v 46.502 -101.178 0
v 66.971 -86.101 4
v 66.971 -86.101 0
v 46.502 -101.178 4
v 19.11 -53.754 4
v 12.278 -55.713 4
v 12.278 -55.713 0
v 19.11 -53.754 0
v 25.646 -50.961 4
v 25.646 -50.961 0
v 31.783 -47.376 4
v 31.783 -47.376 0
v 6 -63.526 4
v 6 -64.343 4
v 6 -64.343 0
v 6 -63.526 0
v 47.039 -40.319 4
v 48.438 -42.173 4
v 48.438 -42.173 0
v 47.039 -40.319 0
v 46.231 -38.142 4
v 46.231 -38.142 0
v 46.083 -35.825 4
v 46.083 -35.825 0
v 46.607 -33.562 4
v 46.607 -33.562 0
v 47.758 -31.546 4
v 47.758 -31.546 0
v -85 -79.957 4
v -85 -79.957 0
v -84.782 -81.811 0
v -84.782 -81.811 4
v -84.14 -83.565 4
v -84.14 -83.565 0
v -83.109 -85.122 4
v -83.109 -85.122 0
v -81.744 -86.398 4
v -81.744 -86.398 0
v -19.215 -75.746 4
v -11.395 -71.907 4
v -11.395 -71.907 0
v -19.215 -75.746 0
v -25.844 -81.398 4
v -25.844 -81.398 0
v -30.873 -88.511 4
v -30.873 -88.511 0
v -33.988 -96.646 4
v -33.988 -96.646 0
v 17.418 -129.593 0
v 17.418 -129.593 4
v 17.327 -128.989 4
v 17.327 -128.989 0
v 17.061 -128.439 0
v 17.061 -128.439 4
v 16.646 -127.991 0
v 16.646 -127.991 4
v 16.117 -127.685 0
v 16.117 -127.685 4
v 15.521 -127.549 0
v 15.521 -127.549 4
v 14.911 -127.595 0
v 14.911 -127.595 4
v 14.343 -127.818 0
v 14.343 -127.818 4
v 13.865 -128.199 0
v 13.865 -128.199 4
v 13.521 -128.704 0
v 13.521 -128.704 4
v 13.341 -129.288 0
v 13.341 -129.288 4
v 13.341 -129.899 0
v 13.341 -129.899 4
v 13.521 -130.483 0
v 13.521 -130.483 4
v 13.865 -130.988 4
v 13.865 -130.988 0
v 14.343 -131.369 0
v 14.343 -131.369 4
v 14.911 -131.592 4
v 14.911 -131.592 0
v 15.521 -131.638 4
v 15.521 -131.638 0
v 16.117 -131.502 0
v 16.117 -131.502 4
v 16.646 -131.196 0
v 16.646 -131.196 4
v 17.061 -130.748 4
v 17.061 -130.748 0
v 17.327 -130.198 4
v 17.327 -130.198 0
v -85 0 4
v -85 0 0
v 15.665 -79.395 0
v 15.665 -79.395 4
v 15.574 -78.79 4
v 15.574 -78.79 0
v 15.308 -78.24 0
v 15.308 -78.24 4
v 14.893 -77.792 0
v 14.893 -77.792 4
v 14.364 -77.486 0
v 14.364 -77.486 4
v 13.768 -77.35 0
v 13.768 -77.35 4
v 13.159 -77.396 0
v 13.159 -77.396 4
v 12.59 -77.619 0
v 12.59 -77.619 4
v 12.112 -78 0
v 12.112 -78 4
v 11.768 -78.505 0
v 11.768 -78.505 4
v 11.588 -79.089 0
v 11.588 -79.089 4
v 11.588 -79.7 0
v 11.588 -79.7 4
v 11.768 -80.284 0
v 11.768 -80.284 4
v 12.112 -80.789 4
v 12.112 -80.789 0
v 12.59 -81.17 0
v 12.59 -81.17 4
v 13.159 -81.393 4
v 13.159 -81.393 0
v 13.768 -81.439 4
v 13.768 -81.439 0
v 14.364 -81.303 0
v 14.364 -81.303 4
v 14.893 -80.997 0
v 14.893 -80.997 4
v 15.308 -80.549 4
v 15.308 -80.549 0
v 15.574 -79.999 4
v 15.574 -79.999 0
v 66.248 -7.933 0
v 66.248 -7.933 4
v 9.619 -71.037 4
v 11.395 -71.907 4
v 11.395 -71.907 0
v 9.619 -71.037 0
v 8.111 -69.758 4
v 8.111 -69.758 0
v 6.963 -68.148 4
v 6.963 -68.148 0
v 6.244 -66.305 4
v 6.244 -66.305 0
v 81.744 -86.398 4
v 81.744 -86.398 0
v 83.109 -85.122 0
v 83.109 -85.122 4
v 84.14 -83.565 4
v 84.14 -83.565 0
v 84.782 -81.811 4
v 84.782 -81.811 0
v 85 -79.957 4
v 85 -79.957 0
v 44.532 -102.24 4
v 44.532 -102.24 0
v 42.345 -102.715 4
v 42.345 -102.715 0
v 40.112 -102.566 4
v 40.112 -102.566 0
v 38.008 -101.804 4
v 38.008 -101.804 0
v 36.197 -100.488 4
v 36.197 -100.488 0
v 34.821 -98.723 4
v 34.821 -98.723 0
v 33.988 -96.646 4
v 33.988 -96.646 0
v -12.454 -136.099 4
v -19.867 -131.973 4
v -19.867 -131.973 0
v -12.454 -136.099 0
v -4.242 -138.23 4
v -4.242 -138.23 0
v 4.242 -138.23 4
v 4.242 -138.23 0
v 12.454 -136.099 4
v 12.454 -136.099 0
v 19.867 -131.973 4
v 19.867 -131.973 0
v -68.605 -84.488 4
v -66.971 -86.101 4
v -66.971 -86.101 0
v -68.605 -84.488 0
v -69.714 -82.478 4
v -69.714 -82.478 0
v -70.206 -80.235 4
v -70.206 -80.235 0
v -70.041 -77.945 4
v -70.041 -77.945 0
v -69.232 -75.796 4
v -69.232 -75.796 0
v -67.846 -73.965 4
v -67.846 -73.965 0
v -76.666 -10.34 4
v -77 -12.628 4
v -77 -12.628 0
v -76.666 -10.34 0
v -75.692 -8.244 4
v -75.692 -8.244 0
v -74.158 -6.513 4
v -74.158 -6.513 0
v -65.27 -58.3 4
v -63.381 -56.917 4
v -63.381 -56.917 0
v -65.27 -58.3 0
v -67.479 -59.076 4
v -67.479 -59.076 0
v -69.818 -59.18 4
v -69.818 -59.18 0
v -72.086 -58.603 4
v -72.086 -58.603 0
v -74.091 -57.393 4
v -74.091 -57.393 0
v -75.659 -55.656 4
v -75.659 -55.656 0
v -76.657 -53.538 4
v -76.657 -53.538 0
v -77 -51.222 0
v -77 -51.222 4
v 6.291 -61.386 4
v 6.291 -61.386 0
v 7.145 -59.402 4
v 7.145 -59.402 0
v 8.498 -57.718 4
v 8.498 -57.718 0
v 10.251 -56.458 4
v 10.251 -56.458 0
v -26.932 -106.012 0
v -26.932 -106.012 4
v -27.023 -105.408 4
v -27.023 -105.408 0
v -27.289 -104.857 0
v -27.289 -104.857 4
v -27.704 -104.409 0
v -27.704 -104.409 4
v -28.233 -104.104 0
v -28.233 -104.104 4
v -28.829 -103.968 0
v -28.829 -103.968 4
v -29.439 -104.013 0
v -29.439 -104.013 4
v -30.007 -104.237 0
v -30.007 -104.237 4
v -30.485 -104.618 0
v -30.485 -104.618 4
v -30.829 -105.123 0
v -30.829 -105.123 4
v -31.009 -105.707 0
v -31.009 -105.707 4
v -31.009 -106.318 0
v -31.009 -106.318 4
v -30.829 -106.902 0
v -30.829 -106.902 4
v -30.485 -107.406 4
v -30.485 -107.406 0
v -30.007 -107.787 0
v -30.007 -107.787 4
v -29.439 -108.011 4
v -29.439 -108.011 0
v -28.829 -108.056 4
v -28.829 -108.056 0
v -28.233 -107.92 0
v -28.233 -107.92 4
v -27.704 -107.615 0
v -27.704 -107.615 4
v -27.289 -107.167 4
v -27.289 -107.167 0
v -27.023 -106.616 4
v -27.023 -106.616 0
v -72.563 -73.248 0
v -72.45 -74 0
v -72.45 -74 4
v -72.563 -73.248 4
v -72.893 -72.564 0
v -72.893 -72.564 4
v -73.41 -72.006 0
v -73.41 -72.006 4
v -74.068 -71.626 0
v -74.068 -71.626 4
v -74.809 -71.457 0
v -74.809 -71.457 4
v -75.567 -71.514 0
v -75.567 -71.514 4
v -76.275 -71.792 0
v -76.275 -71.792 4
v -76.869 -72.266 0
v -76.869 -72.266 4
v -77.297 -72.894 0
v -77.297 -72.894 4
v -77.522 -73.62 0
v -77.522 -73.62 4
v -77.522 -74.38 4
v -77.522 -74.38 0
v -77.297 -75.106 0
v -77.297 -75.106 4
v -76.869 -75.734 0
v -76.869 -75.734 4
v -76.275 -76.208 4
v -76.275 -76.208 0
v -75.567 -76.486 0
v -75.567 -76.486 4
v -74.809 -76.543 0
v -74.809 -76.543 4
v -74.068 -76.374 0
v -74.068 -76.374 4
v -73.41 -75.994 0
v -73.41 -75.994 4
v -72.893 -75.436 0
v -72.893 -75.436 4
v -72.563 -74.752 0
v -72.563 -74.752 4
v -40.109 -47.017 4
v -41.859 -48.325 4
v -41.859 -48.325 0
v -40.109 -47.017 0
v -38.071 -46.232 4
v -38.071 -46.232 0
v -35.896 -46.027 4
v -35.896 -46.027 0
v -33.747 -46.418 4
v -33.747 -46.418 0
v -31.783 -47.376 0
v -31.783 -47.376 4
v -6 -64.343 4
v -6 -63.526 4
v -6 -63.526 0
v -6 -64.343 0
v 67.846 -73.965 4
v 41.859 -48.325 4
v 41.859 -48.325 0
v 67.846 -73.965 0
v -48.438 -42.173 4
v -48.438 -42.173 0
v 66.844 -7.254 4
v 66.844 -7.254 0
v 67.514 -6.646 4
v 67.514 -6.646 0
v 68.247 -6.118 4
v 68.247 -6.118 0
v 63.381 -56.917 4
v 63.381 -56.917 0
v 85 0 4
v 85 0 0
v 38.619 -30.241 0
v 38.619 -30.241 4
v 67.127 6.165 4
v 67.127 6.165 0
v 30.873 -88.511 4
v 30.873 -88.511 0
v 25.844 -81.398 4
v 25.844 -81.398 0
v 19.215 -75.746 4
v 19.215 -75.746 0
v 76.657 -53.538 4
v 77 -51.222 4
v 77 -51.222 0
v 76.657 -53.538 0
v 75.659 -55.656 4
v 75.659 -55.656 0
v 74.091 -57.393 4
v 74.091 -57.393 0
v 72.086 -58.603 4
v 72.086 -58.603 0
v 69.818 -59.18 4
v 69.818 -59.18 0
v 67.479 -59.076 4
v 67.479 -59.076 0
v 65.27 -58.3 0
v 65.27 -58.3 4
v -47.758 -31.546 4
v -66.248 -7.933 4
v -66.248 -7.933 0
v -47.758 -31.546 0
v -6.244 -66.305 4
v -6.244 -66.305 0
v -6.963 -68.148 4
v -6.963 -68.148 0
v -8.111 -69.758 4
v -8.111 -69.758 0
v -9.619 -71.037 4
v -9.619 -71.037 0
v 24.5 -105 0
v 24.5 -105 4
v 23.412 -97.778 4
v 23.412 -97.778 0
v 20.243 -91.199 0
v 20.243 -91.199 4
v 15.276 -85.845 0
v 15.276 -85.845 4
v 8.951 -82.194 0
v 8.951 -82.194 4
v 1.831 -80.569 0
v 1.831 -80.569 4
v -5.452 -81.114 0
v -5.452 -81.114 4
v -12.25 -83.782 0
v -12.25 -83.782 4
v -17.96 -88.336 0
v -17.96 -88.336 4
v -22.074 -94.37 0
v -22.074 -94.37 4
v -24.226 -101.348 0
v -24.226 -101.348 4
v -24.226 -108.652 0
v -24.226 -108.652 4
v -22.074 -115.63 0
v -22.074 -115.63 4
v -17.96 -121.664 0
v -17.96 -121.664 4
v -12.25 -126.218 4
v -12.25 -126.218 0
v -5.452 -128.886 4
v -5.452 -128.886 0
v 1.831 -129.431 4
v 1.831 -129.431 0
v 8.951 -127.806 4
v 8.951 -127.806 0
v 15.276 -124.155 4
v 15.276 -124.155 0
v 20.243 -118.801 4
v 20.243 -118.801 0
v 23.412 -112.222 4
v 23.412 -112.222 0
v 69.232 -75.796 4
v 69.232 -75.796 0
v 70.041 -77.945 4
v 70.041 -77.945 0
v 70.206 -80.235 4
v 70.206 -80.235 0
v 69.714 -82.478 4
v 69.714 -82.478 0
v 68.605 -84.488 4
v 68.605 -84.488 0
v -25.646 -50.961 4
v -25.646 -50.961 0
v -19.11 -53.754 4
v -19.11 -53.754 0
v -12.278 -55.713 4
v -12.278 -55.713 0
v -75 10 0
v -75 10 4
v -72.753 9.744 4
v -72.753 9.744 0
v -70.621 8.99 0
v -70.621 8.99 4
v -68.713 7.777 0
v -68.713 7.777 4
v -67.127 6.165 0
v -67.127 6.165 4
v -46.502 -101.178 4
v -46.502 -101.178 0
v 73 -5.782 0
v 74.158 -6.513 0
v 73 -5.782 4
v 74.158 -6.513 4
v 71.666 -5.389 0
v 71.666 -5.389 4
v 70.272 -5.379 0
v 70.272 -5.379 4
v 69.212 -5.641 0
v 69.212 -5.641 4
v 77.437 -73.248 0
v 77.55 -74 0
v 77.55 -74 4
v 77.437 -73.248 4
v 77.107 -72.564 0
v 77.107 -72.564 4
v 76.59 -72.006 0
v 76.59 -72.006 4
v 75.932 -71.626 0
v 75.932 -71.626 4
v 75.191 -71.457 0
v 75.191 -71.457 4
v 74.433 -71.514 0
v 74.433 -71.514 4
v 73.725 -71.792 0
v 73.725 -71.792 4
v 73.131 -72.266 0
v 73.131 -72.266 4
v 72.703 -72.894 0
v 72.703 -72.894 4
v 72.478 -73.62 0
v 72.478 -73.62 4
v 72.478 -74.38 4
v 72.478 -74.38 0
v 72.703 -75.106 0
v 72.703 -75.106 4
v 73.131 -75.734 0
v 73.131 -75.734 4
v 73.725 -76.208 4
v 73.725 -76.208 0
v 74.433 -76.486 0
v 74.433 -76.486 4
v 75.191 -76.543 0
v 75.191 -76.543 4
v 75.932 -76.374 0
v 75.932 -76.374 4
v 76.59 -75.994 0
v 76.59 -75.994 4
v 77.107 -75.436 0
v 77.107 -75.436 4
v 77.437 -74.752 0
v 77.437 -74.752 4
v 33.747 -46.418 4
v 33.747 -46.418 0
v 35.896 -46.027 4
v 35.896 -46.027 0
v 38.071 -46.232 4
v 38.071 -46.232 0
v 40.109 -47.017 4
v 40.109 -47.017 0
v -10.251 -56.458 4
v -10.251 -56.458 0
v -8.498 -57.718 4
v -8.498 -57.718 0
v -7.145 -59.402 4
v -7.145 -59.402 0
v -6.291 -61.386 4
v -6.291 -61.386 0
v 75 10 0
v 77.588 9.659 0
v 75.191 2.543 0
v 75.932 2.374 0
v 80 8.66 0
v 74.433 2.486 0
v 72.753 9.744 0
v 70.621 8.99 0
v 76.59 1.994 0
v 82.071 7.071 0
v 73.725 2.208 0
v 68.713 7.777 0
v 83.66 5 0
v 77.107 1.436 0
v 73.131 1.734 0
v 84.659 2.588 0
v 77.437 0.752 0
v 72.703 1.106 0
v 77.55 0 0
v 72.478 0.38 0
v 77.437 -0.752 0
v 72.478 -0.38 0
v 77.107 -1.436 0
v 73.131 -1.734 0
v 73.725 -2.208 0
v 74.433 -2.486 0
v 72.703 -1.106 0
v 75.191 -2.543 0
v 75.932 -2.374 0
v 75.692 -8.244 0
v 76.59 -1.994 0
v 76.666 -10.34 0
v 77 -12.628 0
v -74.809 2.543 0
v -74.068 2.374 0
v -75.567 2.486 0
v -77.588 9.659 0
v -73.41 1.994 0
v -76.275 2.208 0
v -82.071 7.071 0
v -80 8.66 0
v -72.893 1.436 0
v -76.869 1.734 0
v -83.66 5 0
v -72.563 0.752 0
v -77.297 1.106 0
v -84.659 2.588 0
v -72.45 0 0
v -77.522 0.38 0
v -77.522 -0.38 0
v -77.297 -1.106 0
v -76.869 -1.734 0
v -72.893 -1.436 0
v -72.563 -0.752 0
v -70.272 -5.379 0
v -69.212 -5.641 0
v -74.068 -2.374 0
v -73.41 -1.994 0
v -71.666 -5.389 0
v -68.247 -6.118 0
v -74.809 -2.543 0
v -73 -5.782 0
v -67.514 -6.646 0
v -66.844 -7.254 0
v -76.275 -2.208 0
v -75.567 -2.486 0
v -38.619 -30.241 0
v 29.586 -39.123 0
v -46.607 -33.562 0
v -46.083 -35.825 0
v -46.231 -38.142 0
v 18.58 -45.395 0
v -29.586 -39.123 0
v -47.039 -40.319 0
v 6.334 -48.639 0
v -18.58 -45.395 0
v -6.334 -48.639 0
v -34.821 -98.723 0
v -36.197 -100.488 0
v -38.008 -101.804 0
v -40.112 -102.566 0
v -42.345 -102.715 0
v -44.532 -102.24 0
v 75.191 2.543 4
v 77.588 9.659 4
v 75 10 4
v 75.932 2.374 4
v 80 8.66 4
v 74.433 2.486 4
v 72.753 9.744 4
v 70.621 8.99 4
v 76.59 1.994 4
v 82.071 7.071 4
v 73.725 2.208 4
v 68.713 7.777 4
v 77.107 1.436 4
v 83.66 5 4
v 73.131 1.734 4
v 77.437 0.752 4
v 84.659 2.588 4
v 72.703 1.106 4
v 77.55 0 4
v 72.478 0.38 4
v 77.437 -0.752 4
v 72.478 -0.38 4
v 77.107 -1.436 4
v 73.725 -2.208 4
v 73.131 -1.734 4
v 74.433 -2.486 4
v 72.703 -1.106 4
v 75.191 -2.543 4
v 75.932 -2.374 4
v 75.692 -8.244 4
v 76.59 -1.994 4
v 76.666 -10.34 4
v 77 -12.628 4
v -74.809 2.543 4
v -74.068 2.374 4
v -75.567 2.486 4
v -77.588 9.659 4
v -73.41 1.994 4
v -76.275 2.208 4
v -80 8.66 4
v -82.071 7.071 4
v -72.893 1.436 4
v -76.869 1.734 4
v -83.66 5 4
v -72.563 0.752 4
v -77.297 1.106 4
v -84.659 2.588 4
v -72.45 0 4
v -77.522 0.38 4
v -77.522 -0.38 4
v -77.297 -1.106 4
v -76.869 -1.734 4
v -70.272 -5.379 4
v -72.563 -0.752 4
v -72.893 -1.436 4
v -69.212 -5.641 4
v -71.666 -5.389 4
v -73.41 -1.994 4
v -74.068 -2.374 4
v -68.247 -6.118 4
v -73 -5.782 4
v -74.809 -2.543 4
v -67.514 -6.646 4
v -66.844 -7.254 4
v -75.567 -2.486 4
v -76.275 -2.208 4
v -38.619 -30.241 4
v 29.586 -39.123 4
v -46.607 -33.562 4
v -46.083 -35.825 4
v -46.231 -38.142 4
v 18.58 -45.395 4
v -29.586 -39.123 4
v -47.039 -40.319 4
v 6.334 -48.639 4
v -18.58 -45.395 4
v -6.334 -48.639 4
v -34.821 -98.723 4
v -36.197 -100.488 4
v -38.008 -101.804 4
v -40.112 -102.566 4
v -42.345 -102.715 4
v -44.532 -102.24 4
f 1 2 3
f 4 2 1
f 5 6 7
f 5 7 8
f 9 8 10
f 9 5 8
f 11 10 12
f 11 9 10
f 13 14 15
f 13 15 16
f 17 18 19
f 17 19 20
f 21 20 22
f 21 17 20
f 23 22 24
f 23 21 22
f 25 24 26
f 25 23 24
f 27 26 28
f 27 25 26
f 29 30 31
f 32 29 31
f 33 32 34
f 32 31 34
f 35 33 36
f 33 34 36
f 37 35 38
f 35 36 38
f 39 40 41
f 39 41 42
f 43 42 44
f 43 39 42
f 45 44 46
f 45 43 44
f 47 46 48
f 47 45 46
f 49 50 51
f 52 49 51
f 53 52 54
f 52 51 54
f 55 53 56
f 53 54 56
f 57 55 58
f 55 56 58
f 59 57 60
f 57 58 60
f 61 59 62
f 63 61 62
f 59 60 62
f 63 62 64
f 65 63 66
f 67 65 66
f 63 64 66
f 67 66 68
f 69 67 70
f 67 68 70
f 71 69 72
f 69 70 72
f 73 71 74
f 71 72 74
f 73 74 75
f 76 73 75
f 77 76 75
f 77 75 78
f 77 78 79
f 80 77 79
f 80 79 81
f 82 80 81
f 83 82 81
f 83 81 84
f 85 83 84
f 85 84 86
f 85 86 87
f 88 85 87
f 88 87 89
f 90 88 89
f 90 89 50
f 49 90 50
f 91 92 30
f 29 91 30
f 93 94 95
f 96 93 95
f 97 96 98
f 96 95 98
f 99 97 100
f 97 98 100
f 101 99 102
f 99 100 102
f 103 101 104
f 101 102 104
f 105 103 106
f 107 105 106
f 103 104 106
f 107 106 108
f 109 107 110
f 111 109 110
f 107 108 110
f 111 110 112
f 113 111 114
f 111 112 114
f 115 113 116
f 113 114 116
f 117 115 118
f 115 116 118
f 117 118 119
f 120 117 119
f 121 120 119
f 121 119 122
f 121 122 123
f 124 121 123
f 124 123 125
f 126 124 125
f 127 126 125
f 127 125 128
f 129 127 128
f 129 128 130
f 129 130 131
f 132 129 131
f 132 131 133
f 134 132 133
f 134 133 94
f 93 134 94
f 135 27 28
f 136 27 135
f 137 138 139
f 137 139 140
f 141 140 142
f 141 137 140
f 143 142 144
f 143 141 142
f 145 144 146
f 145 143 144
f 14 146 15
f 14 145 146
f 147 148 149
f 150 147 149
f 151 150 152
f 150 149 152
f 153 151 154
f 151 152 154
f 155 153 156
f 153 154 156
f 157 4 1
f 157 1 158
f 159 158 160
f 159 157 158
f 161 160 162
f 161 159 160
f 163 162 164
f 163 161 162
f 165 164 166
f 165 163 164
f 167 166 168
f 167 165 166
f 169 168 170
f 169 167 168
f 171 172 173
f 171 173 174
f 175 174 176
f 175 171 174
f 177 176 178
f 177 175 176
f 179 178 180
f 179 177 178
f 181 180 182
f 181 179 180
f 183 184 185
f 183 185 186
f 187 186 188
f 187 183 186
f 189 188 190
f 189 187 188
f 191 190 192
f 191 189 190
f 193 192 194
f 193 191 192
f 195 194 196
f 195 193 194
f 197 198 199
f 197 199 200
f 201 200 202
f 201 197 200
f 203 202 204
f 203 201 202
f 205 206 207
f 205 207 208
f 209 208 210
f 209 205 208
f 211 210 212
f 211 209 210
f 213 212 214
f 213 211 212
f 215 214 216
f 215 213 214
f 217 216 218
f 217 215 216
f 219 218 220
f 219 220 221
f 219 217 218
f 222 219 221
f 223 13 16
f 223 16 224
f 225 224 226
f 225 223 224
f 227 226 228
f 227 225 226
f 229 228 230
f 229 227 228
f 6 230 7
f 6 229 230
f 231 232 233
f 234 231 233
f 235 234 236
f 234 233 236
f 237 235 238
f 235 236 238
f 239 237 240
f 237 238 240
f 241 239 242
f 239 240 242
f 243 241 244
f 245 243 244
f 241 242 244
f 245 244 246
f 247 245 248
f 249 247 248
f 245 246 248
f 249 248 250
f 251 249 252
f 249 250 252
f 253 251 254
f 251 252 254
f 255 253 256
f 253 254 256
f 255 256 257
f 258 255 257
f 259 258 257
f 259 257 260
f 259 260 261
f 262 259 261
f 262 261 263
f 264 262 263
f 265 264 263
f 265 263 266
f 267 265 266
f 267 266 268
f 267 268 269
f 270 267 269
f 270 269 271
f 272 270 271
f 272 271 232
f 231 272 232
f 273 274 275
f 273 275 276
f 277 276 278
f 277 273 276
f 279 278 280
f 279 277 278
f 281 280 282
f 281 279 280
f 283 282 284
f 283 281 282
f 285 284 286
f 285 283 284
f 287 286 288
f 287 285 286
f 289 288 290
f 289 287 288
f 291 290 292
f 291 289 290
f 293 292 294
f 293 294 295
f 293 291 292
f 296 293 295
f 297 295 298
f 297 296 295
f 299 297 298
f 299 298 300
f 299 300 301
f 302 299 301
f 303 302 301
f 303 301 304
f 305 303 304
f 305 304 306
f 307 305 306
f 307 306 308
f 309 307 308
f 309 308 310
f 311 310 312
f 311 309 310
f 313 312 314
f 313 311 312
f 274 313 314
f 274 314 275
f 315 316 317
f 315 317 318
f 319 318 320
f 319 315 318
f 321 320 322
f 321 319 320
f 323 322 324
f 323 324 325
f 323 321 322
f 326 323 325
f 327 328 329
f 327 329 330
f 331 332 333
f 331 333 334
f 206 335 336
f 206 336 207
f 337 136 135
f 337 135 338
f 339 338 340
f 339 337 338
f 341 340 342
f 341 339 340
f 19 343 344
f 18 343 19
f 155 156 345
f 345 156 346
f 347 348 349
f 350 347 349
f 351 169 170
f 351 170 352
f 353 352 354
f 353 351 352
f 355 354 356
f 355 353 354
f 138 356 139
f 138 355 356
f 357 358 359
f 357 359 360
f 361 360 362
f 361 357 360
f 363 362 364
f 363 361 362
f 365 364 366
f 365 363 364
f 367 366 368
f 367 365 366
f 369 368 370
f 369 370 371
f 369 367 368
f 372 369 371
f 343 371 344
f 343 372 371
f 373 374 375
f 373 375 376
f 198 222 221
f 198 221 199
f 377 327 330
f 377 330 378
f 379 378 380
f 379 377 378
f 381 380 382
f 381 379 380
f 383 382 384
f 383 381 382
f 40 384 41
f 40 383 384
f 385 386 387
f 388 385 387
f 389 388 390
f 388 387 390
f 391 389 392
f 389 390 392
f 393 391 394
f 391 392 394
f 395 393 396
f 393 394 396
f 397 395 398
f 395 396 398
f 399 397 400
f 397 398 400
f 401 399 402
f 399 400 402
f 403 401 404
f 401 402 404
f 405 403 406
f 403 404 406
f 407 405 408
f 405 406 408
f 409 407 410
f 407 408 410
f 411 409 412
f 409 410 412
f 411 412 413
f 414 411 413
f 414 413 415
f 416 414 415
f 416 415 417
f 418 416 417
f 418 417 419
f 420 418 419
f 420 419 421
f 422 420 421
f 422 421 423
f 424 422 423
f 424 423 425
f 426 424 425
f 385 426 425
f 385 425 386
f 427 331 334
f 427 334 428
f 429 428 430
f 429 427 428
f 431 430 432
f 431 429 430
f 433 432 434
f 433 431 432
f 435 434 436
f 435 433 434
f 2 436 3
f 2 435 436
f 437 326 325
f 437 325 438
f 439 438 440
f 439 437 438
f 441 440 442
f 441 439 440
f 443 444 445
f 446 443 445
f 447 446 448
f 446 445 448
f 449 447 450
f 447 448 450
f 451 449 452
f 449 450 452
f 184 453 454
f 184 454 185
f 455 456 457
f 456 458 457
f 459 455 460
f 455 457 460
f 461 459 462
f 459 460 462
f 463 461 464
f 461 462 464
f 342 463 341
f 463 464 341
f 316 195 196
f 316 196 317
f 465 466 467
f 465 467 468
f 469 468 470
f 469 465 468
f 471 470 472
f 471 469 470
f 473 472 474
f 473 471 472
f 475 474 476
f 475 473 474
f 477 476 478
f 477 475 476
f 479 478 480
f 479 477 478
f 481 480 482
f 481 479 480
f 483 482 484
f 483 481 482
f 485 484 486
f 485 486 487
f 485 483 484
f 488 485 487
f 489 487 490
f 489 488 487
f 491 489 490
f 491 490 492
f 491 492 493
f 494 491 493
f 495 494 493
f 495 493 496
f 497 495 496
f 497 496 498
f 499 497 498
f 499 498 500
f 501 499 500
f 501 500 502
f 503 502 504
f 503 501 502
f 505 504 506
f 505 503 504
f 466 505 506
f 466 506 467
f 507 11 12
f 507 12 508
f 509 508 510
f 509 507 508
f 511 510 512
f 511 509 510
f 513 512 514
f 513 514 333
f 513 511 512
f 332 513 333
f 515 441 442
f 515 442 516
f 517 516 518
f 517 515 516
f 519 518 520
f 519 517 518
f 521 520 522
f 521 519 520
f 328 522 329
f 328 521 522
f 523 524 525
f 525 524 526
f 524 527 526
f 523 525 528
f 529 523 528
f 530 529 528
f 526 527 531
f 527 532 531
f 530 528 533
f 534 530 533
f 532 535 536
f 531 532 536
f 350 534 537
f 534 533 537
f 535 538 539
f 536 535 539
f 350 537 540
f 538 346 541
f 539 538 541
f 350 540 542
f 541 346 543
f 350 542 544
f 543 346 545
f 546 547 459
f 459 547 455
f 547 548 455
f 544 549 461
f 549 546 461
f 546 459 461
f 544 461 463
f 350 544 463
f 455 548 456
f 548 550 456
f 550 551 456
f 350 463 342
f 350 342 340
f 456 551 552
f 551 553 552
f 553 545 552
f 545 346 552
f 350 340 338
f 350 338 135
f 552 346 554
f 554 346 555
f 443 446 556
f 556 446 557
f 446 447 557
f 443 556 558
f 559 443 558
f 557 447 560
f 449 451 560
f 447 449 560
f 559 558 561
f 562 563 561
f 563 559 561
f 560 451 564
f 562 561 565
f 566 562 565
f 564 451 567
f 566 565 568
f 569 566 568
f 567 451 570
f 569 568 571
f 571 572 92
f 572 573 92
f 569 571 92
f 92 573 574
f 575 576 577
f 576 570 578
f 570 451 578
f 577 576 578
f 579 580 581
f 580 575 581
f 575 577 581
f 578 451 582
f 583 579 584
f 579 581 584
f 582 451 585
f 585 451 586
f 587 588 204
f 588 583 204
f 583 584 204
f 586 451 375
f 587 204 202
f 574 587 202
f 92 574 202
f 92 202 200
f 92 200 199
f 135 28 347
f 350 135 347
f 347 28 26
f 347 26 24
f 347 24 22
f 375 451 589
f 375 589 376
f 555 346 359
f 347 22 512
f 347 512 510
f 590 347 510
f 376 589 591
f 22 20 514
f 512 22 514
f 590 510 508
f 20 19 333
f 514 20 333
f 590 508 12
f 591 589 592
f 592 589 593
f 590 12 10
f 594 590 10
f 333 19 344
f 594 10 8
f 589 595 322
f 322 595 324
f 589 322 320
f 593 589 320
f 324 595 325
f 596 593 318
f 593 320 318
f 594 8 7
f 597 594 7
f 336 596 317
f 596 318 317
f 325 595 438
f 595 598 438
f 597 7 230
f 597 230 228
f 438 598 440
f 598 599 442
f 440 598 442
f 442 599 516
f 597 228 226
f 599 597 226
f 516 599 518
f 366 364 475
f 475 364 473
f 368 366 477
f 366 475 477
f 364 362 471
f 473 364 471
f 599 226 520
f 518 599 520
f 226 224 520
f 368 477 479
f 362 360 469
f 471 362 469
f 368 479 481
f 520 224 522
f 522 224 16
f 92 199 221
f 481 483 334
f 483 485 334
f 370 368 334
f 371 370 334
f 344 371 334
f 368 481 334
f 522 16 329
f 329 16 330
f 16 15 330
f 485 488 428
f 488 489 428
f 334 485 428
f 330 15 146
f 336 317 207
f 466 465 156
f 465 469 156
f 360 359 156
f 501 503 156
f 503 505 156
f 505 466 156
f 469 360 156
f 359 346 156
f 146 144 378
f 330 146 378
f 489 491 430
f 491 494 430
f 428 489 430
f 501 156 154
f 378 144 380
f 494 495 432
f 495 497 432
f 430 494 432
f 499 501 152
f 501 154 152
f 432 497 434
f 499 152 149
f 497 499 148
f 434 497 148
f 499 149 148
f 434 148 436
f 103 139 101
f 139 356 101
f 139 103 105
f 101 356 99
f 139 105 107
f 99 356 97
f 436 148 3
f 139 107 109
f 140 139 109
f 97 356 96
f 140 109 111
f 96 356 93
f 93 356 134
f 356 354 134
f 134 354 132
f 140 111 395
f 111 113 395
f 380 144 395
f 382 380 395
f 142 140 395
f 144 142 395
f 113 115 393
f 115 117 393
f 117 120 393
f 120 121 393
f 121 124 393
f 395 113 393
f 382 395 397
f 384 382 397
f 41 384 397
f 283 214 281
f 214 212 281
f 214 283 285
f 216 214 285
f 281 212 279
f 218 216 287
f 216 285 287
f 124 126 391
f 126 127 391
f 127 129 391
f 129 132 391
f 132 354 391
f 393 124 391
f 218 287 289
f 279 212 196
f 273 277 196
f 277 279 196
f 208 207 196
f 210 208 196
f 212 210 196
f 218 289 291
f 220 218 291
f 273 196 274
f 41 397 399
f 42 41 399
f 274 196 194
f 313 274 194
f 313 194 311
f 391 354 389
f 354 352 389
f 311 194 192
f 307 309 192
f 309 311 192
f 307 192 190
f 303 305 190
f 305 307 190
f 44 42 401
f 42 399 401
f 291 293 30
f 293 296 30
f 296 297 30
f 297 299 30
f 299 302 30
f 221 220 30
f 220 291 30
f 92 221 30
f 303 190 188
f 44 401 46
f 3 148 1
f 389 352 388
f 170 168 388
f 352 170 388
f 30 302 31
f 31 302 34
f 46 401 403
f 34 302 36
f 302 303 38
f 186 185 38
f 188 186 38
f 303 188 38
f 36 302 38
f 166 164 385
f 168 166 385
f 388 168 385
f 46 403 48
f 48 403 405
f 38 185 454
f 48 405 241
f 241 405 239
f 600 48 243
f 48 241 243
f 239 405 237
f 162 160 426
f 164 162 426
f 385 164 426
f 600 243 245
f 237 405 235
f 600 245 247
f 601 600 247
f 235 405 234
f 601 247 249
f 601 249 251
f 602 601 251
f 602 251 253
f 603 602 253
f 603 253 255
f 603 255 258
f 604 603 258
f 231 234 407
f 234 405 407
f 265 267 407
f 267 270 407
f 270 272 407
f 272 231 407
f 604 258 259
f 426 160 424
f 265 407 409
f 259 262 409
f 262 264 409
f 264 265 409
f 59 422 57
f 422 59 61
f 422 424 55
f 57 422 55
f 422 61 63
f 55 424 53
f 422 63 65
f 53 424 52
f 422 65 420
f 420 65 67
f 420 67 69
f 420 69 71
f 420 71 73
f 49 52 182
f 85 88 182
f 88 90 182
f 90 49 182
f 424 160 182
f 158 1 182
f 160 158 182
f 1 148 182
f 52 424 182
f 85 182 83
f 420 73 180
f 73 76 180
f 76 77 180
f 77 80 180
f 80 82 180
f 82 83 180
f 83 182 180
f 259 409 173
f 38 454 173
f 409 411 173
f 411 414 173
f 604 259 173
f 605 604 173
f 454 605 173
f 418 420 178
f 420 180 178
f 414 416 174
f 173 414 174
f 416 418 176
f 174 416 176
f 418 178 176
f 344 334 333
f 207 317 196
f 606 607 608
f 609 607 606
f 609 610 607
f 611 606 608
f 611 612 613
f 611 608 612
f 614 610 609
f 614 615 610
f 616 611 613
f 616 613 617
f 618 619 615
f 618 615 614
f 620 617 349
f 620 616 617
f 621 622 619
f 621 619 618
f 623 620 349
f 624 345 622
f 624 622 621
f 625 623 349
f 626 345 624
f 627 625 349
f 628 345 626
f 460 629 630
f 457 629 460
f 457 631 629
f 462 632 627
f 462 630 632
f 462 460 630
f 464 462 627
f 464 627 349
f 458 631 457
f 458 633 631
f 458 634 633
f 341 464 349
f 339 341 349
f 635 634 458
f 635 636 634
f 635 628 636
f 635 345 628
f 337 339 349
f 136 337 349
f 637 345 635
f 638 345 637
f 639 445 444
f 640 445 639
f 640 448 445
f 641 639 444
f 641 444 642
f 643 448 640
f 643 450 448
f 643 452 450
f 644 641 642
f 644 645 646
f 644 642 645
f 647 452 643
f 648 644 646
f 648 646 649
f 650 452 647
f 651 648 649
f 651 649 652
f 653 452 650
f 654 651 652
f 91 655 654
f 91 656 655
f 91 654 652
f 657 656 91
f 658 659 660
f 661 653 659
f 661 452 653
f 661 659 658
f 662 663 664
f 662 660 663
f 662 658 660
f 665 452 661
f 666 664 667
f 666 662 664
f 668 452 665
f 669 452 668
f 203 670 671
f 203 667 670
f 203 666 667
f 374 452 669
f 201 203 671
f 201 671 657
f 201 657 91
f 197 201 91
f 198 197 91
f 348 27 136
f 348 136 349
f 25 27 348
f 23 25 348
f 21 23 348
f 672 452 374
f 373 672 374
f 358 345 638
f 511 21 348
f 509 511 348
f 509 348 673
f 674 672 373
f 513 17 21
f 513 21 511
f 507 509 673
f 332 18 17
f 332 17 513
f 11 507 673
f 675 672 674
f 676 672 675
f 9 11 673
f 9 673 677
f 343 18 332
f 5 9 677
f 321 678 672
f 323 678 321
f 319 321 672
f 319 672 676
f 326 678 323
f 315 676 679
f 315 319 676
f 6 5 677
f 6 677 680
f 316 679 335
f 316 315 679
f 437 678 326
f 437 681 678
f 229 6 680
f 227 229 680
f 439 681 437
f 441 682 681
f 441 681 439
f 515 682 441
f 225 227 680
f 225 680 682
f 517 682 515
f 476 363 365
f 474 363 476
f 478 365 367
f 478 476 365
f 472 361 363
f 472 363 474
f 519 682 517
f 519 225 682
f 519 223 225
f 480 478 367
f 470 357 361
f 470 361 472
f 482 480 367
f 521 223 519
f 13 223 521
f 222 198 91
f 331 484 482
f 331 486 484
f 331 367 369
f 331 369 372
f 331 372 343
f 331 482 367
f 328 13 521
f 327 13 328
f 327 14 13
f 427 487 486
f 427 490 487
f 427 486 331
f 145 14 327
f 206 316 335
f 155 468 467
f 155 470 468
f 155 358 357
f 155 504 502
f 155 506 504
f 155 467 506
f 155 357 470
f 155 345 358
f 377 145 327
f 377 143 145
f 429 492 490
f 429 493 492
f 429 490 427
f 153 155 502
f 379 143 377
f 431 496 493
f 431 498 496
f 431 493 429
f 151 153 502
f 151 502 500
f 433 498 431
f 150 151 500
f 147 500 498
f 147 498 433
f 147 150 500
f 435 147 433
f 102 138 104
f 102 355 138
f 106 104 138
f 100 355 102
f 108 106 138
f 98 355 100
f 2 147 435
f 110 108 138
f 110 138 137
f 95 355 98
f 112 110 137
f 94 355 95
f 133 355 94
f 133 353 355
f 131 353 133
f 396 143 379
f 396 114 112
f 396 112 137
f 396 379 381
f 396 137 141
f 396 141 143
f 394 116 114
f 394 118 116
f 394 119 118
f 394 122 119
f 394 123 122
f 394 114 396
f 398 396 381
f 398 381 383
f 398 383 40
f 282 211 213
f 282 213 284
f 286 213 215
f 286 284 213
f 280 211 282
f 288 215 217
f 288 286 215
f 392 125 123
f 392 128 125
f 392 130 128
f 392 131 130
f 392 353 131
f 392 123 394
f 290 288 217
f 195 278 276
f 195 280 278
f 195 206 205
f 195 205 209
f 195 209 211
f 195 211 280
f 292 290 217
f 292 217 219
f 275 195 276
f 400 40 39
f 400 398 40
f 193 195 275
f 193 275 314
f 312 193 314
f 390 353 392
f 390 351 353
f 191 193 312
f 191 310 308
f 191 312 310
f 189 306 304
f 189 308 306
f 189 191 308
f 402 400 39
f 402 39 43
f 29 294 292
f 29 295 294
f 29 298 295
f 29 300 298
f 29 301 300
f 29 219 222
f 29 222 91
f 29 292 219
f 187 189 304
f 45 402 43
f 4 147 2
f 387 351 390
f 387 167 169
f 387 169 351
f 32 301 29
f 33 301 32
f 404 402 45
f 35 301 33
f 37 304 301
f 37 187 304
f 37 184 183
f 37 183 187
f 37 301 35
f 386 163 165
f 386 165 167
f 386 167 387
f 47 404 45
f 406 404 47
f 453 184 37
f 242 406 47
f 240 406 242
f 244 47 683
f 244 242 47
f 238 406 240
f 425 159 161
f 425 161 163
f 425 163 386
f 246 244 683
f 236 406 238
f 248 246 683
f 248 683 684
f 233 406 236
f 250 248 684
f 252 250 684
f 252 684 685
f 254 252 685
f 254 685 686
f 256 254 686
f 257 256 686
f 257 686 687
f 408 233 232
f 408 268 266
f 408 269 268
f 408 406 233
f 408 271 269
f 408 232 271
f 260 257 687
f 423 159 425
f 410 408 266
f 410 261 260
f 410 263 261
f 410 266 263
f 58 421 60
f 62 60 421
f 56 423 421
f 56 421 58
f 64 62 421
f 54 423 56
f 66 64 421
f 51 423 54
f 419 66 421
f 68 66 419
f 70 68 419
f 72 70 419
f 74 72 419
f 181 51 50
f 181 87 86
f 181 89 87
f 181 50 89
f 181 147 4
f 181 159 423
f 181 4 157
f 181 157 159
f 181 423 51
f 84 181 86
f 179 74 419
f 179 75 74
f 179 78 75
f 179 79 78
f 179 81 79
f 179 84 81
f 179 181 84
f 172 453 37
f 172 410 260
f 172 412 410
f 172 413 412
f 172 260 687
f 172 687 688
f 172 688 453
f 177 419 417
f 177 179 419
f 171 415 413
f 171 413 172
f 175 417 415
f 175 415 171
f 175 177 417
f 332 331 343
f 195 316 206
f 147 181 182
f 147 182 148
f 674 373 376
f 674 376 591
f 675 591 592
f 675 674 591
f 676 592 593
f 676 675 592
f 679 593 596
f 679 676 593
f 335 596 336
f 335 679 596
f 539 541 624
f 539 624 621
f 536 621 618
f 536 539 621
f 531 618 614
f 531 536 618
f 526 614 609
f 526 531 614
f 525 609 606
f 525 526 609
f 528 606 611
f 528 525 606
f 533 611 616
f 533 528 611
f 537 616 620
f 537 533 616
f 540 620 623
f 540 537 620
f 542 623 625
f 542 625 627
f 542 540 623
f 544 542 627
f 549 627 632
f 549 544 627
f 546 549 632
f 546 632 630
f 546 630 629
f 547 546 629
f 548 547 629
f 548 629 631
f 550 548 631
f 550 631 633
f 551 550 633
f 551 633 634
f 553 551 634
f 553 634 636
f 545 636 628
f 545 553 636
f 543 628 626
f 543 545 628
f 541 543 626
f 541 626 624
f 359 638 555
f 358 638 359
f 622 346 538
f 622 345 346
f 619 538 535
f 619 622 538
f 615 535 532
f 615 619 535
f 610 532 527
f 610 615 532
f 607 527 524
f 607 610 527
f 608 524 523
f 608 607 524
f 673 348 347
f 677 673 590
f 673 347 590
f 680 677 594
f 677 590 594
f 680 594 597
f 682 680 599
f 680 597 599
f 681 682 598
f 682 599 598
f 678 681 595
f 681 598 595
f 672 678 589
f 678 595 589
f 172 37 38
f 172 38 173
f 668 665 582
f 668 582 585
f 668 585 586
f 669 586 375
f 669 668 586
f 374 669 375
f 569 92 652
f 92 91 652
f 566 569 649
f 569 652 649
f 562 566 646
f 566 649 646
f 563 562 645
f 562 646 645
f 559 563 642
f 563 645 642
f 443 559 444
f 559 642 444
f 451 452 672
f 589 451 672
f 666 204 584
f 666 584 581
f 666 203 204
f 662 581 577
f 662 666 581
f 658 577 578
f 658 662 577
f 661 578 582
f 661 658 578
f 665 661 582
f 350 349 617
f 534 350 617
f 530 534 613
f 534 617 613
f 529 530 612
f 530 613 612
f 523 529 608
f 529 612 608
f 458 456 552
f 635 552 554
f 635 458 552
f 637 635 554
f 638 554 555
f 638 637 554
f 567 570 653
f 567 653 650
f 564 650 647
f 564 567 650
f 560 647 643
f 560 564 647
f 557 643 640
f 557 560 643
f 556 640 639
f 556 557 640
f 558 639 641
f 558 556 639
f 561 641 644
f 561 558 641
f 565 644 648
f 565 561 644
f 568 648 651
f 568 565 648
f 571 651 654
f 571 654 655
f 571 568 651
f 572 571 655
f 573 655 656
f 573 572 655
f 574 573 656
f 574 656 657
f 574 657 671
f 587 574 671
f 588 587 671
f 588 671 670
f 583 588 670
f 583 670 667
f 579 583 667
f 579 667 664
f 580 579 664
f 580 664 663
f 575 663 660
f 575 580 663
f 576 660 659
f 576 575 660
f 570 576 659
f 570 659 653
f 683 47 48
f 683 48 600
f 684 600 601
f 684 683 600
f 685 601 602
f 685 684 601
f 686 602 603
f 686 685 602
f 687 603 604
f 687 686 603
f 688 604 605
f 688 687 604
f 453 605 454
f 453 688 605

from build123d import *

# Parameters (mm, degrees)
SKETCH_1_R          = 2.55
EXTRUDE_1_DEPTH     = 4
EXTRUDE_2_DEPTH     = 4
FILLET_2_R          = 10
SKETCH_5_R          = 2.05
SKETCH_5_R_2        = 24.5
CUT_EXTRUDE_1_DEPTH = 5
CUT_EXTRUDE_2_DEPTH = 5
CUT_EXTRUDE_3_DEPTH = 25
FILLET_3_R          = 8
FILLET_4_R          = 5


with BuildPart() as part:
    # 草图1 → 凸台-拉伸1 (new body)
    with BuildSketch(Plane.XY):
        with BuildLine():
            Line((-85, -84), (85, -84))
            Line((85, -84), (85, 10))
            Line((85, 10), (48.019813619, 10))
            ThreePointArc((48.019813619, 10), (0, -49.05), (-48.019813619, 10))
            Line((-48.019813619, 10), (-85, 10))
            Line((-85, 10), (-85, -84))
        make_face()
        with Locations((75, 0)):
            Circle(SKETCH_1_R, mode=Mode.SUBTRACT)
        with Locations((-75, 0)):
            Circle(SKETCH_1_R, mode=Mode.SUBTRACT)
        with Locations((-75, -74)):
            Circle(SKETCH_1_R, mode=Mode.SUBTRACT)
        with Locations((75, -74)):
            Circle(SKETCH_1_R, mode=Mode.SUBTRACT)
    extrude(amount=EXTRUDE_1_DEPTH)

    # 草图2 → 凸台-拉伸2 (add)
    with BuildSketch(Plane.XY.offset(4)):
        with BuildLine():
            Line((-85, -84), (-19.866917685, -131.97323825))
            ThreePointArc((-19.866917685, -131.97323825), (0, -138.5), (19.866917685, -131.97323825))
            Line((19.866917685, -131.97323825), (85, -84))
            Line((85, -84), (-85, -84))
        make_face()
    extrude(amount=-EXTRUDE_2_DEPTH)

    # 圆角2
    fillet_2_edges = [part.edges().sort_by_distance(p)[0] for p in [
        (85, 10, 2),
        (-85, 10, 2),
    ]]
    fillet(fillet_2_edges, radius=FILLET_2_R)

    # 草图5 → 切除-拉伸1 (cut)
    with BuildSketch(Plane.XY.offset(4)):
        with Locations((15.367658663, -129.593394789)):
            Circle(SKETCH_5_R)
        with Locations((-28.982333984, -106.012085404)):
            Circle(SKETCH_5_R)
        with Locations((13.614675321, -79.394519807)):
            Circle(SKETCH_5_R)
        with Locations((0, -105)):
            Circle(SKETCH_5_R_2)
    extrude(amount=-CUT_EXTRUDE_1_DEPTH, mode=Mode.SUBTRACT)

    # 草图6 → 切除-拉伸2 (cut)
    with BuildSketch(Plane.XY.offset(4)):
        with BuildLine():
            Line((-67.126666667, 6.165275519), (-38.6187, -30.24067642))
            Line((-38.6187, -30.24067642), (38.6187, -30.24067642))
            Line((38.6187, -30.24067642), (67.126666667, 6.165275519))
            ThreePointArc((67.126666667, 6.165275519), (70.621230492, 8.990349136), (75, 10))
            Line((75, 10), (-75, 10))
            ThreePointArc((-75, 10), (-70.621230492, 8.990349136), (-67.126666667, 6.165275519))
        make_face()
    extrude(amount=-CUT_EXTRUDE_2_DEPTH, mode=Mode.SUBTRACT)

    # 草图7 → 切除-拉伸3 (cut)
    with BuildSketch(Plane.XY.offset(4)):
        Polygon((-77, -5.144778907), (-68.857155974, -4.600712255), (-43.359613768, -37.162217147), (-77, -70.354064895), align=None)
        with BuildLine():
            ThreePointArc((-36.942273764, -43.473795661), (-22.471434931, -52.437935811), (-6, -56.733609968))
            Line((-6, -56.733609968), (-6, -70.518120701))
            ThreePointArc((-6, -70.518120701), (-28.302069217, -84.408912655), (-34.654792832, -109.903604165))
            Line((-34.654792832, -109.903604165), (-74.514618659, -80.545175958))
            Line((-74.514618659, -80.545175958), (-36.942273764, -43.473795661))
        make_face()
        with BuildLine():
            ThreePointArc((34.654792832, -109.903604165), (28.302069217, -84.408912655), (6, -70.518120701))
            Line((6, -70.518120701), (6, -56.733609968))
            ThreePointArc((6, -56.733609968), (22.471434931, -52.437935811), (36.942273764, -43.473795661))
            Line((36.942273764, -43.473795661), (74.514618659, -80.545175958))
            Line((74.514618659, -80.545175958), (34.654792832, -109.903604165))
        make_face()
        Polygon((77, -70.354064895), (43.359613768, -37.162217147), (68.857155974, -4.600712255), (77, -5.144778907), align=None)
    extrude(amount=-CUT_EXTRUDE_3_DEPTH, mode=Mode.SUBTRACT)

    # 圆角3
    # the kernel refuses this fillet: 8 mm, written as the material it adds along each edge
    with BuildSketch(Plane(origin=(-6, -56.733609968, 4), x_dir=(0, -1, 0), z_dir=(0, 0, -1))) as fillet_3_piece_1:
        with BuildLine():
            CenterArc((6.791995106, 8), FILLET_3_R, 192.428379519, 77.571620481)
            ThreePointArc((-1.020531268, 6.278247502), (-0.422700314, 3.153357523), (0, 0))
            Line((0, 0), (6.791995106, 0))
        make_face()
    extrude(amount=4)
    with BuildSketch(Plane(origin=(-6, -70.518120701, 4), x_dir=(-0.9684273836136271, -0.2492958135774943, 0), z_dir=(0, 0, -1))) as fillet_3_piece_2:
        with BuildLine():
            CenterArc((6.207961727, 7.97462195), FILLET_3_R, 194.435845985, 70.999197637)
            Line((-1.539457342, 5.980255442), (0, 0))
            ThreePointArc((0, 0), (2.785623852, 0.111028967), (5.571247704, 0))
        make_face()
    extrude(amount=4)
    with BuildSketch(Plane(origin=(-34.654792832, -109.903604165, 4), x_dir=(-0.8051712910421941, 0.5930423189633656, 0), z_dir=(0, 0, -1))) as fillet_3_piece_3:
        with BuildLine():
            CenterArc((14.713311973, 8), FILLET_3_R, 157.435643024, 112.564356976)
            ThreePointArc((7.325719141, 11.069767442), (4.192460552, 5.184405893), (0, 0))
            Line((0, 0), (14.713311973, 0))
        make_face()
    extrude(amount=4)
    with BuildSketch(Plane(origin=(-74.514618659, -80.545175958, 4), x_dir=(0.711836432832338, 0.7023452803945736, 0), z_dir=(0, 0, -1)), Plane(origin=(74.514618659, -80.545175958, 4), x_dir=(-0.8051712910421942, -0.5930423189633655, 0), z_dir=(0, 0, -1))) as fillet_3_piece_4:
        with BuildLine():
            CenterArc((FILLET_3_R * 1.17108402506, FILLET_3_R), FILLET_3_R, 170.988669267, 99.011330733)
            Line((FILLET_3_R * 0.183426640042, FILLET_3_R * 1.15662978584), (0, 0))
            Line((0, 0), (FILLET_3_R * 1.17108402506, 0))
        make_face()
    extrude(amount=4)
    with BuildSketch(Plane(origin=(-36.942273764, -43.473795661, 4), x_dir=(-0.711836432832338, -0.7023452803945739, 0), z_dir=(0, 0, -1))) as fillet_3_piece_5:
        with BuildLine():
            CenterArc((6.907291952, -8), FILLET_3_R, 90, 78.47203041)
            ThreePointArc((-0.931326161, -6.401229823), (-0.374864481, -3.213825359), (0, 0))
            Line((0, 0), (6.907291952, 0))
        make_face()
    extrude(amount=4)
    with BuildSketch(Plane(origin=(43.359613768, -37.162217147, 4), x_dir=(0.616527551876007, 0.7873333333333332, 0), z_dir=(0, 0, -1)), Plane(origin=(-43.359613768, -37.162217147, 4), x_dir=(-0.7118364328323388, -0.7023452803945729, 0), z_dir=(0, 0, -1))) as fillet_3_piece_6:
        with BuildLine():
            CenterArc((FILLET_3_R * 0.891711791031, FILLET_3_R), FILLET_3_R, 186.552471372, 83.447528628)
            Line((-FILLET_3_R * 0.101755976712, FILLET_3_R * 0.885886922506), (0, 0))
            Line((0, 0), (FILLET_3_R * 0.891711791031, 0))
        make_face()
    extrude(amount=4)
    with BuildSketch(Plane(origin=(68.857155974, -4.600712255, 4), x_dir=(0.9977753031397176, -0.06666666666666672, 0), z_dir=(0, 0, -1)), Plane(origin=(-68.857155974, -4.600712255, 4), x_dir=(0.6165275518760065, -0.7873333333333337, 0), z_dir=(0, 0, -1))) as fillet_3_piece_7:
        with BuildLine():
            CenterArc((FILLET_3_R * 0.529020931448, FILLET_3_R), FILLET_3_R, 214.240445239, 55.759554761)
            Line((-FILLET_3_R * 0.297662660682, FILLET_3_R * 0.437332923922), (0, 0))
            Line((0, 0), (FILLET_3_R * 0.529020931448, 0))
        make_face()
    extrude(amount=4)
    with BuildSketch(Plane(origin=(77, -5.144778907, 4), x_dir=(0, -1, 0), z_dir=(0, 0, -1))) as fillet_3_piece_8:
        with BuildLine():
            CenterArc((FILLET_3_R * 0.935414346693, FILLET_3_R), FILLET_3_R, 183.822553729, 86.177446271)
            Line((-FILLET_3_R * 0.0623609564462, FILLET_3_R * 0.933333333333), (0, 0))
            Line((0, 0), (FILLET_3_R * 0.935414346693, 0))
        make_face()
    extrude(amount=4)
    with BuildSketch(Plane(origin=(77, -70.354064895, 4), x_dir=(0, 1, 0), z_dir=(0, 0, -1))) as fillet_3_piece_9:
        with BuildLine():
            CenterArc((FILLET_3_R * 2.39148377615, -FILLET_3_R), FILLET_3_R, 90, 134.61547034)
            Line((FILLET_3_R * 1.67964734332, -FILLET_3_R * 1.70234528039), (0, 0))
            Line((0, 0), (FILLET_3_R * 2.39148377615, 0))
        make_face()
    extrude(amount=4)
    with BuildSketch(Plane(origin=(-77, -70.354064895, 4), x_dir=(0, 1, 0), z_dir=(0, 0, -1))) as fillet_3_piece_10:
        with BuildLine():
            CenterArc((FILLET_3_R * 2.39148377615, FILLET_3_R), FILLET_3_R, 135.38452966, 134.61547034)
            Line((FILLET_3_R * 1.67964734332, FILLET_3_R * 1.70234528039), (0, 0))
            Line((0, 0), (FILLET_3_R * 2.39148377615, 0))
        make_face()
    extrude(amount=4)
    with BuildSketch(Plane(origin=(-77, -5.144778907, 4), x_dir=(0, -1, 0), z_dir=(0, 0, -1))) as fillet_3_piece_11:
        with BuildLine():
            CenterArc((FILLET_3_R * 0.935414346693, -FILLET_3_R), FILLET_3_R, 90, 86.177446271)
            Line((-FILLET_3_R * 0.0623609564462, -FILLET_3_R * 0.933333333333), (0, 0))
            Line((0, 0), (FILLET_3_R * 0.935414346693, 0))
        make_face()
    extrude(amount=4)
    with BuildSketch(Plane(origin=(6, -56.733609968, 4), x_dir=(0.9870448668515611, 0.16044447893892722, 0), z_dir=(0, 0, -1))) as fillet_3_piece_12:
        with BuildLine():
            CenterArc((6.806620819, 7.987559736), FILLET_3_R, 189.232696301, 77.571620481)
            Line((-1.089738116, 6.704003905), (0, 0))
            ThreePointArc((0, 0), (3.180325289, 0.08871463), (6.360650577, 0))
        make_face()
    extrude(amount=4)
    with BuildSketch(Plane(origin=(36.942273764, -43.473795661, 4), x_dir=(0.7118364328323379, -0.7023452803945738, 0), z_dir=(0, 0, -1))) as fillet_3_piece_13:
        with BuildLine():
            CenterArc((6.907291952, 8), FILLET_3_R, 191.52796959, 78.47203041)
            ThreePointArc((-0.931326161, 6.401229823), (-0.374864481, 3.213825359), (0, 0))
            Line((0, 0), (6.907291952, 0))
        make_face()
    extrude(amount=4)
    with BuildSketch(Plane(origin=(6, -70.518120701, 4), x_dir=(0, 1, 0), z_dir=(0, 0, -1))) as fillet_3_piece_14:
        with BuildLine():
            CenterArc((6.175223401, 8), FILLET_3_R, 199.000802363, 70.999197637)
            ThreePointArc((-1.388888729, 5.395348837), (-0.586920873, 2.725353475), (0, 0))
            Line((0, 0), (6.175223401, 0))
        make_face()
    extrude(amount=4)
    with BuildSketch(Plane(origin=(34.654792832, -109.903604165, 4), x_dir=(0.8051712910421941, 0.5930423189633658, 0), z_dir=(0, 0, -1))) as fillet_3_piece_15:
        with BuildLine():
            CenterArc((14.713311973, -8), FILLET_3_R, 90, 112.564356976)
            ThreePointArc((7.325719141, -11.069767442), (4.192460552, -5.184405893), (0, 0))
            Line((0, 0), (14.713311973, 0))
        make_face()
    extrude(amount=4)
    # the kernel refuses this fillet: 8 mm, written as the material it takes off along each edge
    with BuildSketch(Plane(origin=(-85, -84, -10.108598892), x_dir=(0, 1, 0), z_dir=(0, 0, 1))) as fillet_3_2_piece_1:
        with BuildLine():
            CenterArc((FILLET_3_R * 0.505429944614, -FILLET_3_R), FILLET_3_R, 90, 53.626801073)
            Line((-FILLET_3_R * 0.299741346428, -FILLET_3_R * 0.406957681037), (0, 0))
            Line((0, 0), (FILLET_3_R * 0.505429944614, 0))
        make_face()
    extrude(amount=24.217197785, mode=Mode.SUBTRACT)
    with BuildSketch(Plane(origin=(85, -84, -10.108598892), x_dir=(0, 1, 0), z_dir=(0, 0, 1))) as fillet_3_2_piece_2:
        with BuildLine():
            CenterArc((FILLET_3_R * 0.505429944614, FILLET_3_R), FILLET_3_R, 216.373198927, 53.626801073)
            Line((-FILLET_3_R * 0.299741346428, FILLET_3_R * 0.406957681037), (0, 0))
            Line((0, 0), (FILLET_3_R * 0.505429944614, 0))
        make_face()
    extrude(amount=24.217197785, mode=Mode.SUBTRACT)

    # 圆角4
    fillet_4_edges = [part.edges().sort_by_distance(p)[0] for p in [
        (71.293293442, -4.963838649, 2),
        (-71.293293442, -4.963838649, 2),
    ]]
    fillet(fillet_4_edges, radius=FILLET_4_R)


solid = part.part
